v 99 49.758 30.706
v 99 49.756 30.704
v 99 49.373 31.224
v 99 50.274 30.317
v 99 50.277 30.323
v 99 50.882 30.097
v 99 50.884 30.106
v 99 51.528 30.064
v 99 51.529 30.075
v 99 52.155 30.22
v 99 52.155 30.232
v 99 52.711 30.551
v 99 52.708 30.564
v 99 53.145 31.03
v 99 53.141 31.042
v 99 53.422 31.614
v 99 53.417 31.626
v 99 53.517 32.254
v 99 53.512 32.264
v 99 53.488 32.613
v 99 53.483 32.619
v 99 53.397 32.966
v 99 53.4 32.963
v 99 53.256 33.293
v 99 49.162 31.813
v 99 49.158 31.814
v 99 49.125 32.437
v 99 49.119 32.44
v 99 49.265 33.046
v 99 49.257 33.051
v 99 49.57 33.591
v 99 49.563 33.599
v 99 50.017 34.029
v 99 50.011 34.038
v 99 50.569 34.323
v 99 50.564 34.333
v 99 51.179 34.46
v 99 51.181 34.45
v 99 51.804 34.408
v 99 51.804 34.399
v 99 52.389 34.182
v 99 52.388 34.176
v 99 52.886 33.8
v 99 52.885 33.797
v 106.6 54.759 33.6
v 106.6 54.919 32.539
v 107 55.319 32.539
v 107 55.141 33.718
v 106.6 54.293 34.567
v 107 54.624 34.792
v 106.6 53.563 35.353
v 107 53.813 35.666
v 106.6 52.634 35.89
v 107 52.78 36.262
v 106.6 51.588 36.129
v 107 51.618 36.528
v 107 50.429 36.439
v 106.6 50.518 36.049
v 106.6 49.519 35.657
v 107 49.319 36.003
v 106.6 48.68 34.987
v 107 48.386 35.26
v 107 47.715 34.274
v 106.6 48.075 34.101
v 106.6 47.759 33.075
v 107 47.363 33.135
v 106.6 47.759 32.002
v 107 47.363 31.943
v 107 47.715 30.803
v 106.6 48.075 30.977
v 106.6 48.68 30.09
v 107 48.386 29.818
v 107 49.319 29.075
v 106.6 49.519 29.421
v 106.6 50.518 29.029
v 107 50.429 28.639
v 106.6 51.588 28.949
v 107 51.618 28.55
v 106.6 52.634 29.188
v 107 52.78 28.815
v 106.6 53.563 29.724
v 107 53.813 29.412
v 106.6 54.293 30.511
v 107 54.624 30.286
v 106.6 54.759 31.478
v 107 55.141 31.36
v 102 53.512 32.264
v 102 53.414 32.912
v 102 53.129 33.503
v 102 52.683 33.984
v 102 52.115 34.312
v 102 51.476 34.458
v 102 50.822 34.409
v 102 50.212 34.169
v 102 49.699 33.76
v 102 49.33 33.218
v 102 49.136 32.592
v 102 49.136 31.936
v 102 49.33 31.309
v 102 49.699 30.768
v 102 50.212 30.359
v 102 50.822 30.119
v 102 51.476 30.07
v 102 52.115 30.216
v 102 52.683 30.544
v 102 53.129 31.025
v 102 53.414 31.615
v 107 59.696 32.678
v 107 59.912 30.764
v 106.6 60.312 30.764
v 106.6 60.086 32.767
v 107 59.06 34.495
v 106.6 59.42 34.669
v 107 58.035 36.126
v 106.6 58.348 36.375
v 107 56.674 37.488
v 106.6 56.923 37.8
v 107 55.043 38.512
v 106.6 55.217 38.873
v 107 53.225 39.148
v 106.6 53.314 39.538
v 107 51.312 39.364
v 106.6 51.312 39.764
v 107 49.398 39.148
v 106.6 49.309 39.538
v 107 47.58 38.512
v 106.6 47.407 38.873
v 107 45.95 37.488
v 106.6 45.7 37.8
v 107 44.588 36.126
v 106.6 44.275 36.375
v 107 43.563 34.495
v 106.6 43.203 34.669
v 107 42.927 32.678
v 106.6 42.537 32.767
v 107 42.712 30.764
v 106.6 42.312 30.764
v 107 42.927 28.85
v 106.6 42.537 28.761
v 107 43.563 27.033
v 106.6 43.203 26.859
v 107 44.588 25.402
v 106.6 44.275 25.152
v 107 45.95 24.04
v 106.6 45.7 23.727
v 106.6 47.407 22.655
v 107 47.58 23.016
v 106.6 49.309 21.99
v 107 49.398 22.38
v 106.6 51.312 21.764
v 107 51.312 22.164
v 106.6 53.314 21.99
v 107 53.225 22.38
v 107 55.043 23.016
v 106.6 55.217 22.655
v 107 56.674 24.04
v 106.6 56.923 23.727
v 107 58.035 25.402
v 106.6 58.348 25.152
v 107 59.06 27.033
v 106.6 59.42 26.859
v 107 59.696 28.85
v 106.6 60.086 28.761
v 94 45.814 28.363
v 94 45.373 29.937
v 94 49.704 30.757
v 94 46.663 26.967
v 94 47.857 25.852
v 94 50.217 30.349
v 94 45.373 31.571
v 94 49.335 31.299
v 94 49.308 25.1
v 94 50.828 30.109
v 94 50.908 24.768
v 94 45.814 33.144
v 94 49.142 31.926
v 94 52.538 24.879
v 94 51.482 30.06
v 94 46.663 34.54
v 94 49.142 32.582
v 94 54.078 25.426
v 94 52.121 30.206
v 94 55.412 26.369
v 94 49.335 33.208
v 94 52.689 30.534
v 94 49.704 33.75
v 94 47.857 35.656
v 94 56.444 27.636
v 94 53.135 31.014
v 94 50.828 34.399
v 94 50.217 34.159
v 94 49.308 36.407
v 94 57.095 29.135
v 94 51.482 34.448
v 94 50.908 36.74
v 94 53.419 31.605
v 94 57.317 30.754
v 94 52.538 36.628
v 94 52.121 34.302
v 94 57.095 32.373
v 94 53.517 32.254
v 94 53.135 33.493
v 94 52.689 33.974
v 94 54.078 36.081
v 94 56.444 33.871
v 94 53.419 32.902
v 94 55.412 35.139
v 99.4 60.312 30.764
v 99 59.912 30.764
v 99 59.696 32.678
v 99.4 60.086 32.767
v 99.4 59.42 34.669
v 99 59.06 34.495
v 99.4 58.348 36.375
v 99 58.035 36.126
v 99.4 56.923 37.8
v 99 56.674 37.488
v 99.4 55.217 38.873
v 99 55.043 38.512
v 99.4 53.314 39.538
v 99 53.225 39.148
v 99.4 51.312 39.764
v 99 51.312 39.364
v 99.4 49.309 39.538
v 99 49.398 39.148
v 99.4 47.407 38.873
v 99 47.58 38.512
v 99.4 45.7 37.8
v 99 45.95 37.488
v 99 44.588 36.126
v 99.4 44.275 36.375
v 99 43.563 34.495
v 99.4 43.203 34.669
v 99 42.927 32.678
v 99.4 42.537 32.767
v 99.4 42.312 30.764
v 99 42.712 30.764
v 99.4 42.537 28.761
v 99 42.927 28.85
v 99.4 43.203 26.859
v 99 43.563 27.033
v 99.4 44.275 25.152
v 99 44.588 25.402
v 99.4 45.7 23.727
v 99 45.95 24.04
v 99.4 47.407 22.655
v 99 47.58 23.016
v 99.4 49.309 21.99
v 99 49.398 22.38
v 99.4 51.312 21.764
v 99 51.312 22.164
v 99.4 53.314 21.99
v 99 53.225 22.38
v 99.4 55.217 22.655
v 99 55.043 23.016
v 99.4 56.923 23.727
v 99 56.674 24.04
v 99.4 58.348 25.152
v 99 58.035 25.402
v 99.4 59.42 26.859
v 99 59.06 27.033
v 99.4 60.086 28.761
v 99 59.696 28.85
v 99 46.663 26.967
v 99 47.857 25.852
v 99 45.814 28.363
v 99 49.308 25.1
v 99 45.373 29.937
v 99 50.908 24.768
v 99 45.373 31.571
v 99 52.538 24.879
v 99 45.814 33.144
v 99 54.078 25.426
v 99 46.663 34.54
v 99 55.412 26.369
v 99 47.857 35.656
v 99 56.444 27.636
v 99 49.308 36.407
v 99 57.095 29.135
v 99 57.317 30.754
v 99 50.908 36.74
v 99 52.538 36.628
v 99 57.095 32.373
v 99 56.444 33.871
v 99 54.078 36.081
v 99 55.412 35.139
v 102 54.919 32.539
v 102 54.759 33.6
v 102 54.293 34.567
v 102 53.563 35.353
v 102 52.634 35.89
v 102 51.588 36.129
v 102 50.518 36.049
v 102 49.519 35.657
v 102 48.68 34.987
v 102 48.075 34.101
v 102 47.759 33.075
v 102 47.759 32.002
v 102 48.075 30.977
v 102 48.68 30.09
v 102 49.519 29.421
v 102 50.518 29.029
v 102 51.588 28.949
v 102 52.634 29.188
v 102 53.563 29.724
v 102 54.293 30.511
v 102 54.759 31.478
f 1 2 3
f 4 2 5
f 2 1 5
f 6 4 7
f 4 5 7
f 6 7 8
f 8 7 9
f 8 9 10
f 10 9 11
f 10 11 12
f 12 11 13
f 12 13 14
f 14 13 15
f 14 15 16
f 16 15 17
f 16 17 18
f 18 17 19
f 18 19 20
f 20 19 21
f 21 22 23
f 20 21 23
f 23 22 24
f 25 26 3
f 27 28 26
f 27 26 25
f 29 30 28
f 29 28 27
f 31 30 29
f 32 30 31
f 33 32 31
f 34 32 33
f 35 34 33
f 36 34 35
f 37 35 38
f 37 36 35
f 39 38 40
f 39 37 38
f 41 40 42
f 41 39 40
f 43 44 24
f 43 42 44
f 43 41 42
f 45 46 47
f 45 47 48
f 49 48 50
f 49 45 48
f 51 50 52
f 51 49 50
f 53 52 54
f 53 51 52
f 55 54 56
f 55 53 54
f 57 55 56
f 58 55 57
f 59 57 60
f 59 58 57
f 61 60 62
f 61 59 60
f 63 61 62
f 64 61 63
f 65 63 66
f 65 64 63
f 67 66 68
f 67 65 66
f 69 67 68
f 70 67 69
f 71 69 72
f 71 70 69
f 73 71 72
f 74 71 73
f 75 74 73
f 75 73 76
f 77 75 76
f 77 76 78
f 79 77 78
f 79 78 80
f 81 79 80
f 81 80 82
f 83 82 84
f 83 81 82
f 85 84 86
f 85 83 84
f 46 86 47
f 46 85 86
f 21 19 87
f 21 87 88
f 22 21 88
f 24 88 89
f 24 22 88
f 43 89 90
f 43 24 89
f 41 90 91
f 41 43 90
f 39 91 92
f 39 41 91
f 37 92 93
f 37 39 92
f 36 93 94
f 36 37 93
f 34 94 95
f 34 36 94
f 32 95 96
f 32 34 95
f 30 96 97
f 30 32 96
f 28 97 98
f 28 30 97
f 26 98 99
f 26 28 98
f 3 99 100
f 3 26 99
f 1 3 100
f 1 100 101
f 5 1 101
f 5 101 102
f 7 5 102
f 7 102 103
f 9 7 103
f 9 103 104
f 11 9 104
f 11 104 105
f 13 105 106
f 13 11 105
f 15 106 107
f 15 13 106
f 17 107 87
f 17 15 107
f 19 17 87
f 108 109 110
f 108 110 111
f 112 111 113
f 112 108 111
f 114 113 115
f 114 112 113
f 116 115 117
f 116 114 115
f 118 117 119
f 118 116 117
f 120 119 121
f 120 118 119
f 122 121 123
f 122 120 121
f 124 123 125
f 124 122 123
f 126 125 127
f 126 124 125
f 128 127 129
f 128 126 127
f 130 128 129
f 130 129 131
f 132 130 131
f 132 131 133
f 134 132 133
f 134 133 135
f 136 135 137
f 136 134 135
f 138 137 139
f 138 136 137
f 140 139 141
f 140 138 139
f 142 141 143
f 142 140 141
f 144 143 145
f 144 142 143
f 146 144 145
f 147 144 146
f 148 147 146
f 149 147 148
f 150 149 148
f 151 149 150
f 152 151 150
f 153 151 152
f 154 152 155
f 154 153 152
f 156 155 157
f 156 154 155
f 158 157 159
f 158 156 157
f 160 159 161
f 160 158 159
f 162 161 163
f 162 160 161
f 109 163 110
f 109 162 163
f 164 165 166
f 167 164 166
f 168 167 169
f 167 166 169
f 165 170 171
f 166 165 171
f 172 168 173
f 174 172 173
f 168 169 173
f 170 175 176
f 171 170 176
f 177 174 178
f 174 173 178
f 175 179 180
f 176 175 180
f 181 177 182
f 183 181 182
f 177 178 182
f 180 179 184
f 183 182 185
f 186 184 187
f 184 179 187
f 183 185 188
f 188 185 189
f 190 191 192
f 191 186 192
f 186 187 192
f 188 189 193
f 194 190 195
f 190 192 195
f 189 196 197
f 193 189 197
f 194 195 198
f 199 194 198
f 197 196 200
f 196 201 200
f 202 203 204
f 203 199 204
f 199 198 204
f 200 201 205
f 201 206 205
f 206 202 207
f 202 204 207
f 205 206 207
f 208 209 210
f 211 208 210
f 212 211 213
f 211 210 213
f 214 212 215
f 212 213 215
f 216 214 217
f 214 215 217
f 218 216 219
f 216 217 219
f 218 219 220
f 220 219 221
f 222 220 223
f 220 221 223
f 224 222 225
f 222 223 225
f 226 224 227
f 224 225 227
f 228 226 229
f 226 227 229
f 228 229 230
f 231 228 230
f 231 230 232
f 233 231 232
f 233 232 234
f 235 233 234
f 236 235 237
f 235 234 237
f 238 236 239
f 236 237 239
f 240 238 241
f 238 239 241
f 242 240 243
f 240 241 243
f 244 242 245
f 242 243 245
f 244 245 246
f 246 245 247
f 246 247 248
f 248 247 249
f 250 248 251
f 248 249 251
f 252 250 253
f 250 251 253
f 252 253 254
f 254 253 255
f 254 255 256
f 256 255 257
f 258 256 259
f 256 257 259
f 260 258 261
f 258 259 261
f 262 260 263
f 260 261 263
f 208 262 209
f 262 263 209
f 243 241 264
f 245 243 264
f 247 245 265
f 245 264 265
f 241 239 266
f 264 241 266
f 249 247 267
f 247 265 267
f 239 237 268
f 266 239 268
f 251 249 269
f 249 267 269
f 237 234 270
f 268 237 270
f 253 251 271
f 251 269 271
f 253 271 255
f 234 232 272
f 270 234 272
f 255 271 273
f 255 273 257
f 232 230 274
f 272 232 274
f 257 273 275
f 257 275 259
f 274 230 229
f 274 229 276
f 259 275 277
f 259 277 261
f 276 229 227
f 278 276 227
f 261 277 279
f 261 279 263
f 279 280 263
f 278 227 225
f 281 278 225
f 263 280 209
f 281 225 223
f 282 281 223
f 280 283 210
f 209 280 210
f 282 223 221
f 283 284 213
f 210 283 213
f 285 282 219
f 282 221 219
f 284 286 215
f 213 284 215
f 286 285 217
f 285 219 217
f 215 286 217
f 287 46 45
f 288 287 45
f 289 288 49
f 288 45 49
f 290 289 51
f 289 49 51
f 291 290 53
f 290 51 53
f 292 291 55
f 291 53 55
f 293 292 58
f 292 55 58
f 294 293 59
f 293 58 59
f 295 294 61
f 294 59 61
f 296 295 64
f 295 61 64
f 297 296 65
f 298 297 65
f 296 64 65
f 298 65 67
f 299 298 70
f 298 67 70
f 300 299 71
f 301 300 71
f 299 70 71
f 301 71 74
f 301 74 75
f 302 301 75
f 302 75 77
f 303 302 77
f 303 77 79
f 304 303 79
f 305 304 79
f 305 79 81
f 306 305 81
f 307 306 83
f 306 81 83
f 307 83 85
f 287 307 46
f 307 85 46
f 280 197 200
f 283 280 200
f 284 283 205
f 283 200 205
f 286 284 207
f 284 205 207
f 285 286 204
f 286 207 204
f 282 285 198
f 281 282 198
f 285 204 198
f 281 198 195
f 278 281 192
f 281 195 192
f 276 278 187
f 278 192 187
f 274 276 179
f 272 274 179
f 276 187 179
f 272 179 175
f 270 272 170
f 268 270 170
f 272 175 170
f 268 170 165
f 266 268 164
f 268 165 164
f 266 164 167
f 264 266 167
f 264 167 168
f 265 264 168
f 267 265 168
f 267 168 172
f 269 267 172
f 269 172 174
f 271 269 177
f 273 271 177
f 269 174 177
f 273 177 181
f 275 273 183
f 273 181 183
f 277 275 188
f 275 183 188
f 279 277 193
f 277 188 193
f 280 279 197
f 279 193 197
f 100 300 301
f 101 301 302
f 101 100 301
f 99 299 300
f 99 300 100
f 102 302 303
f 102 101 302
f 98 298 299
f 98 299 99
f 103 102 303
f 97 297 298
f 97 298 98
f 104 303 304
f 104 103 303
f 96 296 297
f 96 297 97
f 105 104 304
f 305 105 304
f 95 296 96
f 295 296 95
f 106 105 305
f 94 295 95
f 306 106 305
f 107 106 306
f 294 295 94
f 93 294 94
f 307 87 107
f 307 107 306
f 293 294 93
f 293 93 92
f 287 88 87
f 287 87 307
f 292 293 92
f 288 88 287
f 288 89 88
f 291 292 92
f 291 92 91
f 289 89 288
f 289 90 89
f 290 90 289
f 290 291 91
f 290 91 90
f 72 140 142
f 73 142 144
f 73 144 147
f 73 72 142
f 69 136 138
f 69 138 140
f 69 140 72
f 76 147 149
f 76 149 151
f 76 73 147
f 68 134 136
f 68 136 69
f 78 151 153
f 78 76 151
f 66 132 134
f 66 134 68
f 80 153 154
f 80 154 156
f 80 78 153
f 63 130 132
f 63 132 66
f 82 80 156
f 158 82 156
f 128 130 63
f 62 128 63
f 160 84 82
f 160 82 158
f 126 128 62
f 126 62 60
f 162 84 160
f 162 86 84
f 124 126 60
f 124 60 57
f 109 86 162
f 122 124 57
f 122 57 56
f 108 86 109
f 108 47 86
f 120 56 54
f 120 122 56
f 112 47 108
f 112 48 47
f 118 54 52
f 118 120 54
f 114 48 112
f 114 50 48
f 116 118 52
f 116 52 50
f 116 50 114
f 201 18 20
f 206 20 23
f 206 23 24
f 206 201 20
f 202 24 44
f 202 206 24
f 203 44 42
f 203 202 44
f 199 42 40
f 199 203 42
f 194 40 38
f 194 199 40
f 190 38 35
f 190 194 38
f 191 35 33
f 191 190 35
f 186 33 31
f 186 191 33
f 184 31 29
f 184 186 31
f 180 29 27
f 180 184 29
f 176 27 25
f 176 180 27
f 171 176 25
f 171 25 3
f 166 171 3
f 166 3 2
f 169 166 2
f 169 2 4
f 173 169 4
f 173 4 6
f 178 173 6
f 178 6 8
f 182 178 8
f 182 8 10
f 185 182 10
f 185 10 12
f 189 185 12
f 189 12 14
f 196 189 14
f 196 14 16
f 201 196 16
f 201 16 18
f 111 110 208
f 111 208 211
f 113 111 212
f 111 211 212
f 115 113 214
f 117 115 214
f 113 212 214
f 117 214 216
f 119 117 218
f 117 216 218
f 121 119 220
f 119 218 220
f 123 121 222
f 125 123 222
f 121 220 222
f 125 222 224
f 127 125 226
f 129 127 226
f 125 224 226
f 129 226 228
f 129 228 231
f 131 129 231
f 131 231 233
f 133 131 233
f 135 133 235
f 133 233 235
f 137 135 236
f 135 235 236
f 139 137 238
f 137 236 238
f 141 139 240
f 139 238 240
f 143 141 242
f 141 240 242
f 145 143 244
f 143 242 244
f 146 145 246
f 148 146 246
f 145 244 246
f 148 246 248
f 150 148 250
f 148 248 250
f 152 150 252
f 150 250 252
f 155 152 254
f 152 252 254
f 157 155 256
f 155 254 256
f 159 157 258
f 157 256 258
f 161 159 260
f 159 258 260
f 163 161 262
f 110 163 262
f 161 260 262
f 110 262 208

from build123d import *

# Parameters (mm, degrees)
SKETCH005_R             = 6
SKETCH005_R_2           = 2.2
PAD002_DEPTH            = 5
SKETCH006_R             = 9
SKETCH006_R_2           = 2.2
PAD003_DEPTH            = 8
SKETCH007_R             = 3.6
POCKET_DEPTH            = 5
CHAMFER002_SIZE         = 0.4
BODY002_PLACEMENT_ANGLE = 90


with BuildPart() as part:
    # Sketch005 → Pad002 (new body)
    with BuildSketch(Plane.XZ):
        with Locations((66.64711, 33.3637672875)):
            Circle(SKETCH005_R)
        with Locations((66.64711, 34.8637672875)):
            Circle(SKETCH005_R_2, mode=Mode.SUBTRACT)
    extrude(amount=PAD002_DEPTH)

    # Sketch006 (on Face4 of Pad002) → Pad003 (join)
    with BuildSketch(Plane.XZ.offset(5)):
        with Locations((66.641708, 33.373905)):
            Circle(SKETCH006_R)
        with Locations((66.641708, 34.873905)):
            Circle(SKETCH006_R_2, mode=Mode.SUBTRACT)
    extrude(amount=PAD003_DEPTH)

    # Sketch007 (on Face8 of Pad003) → Pocket (cut)
    with BuildSketch(Plane.XZ.offset(13)):
        with Locations((66.648621, 35.148872)):
            Circle(SKETCH007_R)
    extrude(amount=-POCKET_DEPTH, mode=Mode.SUBTRACT)

    # Chamfer002
    chamfer002_edges = [part.edges().sort_by_distance(p)[0] for p in [
        (57.641708, -13, 33.373905),
        (57.641708, -5, 33.373905),
        (63.048621, -13, 35.148872),
    ]]
    chamfer(chamfer002_edges, length=CHAMFER002_SIZE)


with BuildPart() as part_1:
    # Body001 placement: moved
    add(part.part.moved(Location((0, -3, 0))))


with BuildPart() as part_2:
    # Clone placement: moved
    add(part_1.part.moved(Location((0, 3, 0))))


with BuildPart() as part_3:
    # Body002 placement: moved
    add(part_2.part.moved(Location((94, -15.33, -2.61))).rotate(Axis((94, -15.33, -2.61), (0, 0, 1)), BODY002_PLACEMENT_ANGLE))


solid = part_3.part
